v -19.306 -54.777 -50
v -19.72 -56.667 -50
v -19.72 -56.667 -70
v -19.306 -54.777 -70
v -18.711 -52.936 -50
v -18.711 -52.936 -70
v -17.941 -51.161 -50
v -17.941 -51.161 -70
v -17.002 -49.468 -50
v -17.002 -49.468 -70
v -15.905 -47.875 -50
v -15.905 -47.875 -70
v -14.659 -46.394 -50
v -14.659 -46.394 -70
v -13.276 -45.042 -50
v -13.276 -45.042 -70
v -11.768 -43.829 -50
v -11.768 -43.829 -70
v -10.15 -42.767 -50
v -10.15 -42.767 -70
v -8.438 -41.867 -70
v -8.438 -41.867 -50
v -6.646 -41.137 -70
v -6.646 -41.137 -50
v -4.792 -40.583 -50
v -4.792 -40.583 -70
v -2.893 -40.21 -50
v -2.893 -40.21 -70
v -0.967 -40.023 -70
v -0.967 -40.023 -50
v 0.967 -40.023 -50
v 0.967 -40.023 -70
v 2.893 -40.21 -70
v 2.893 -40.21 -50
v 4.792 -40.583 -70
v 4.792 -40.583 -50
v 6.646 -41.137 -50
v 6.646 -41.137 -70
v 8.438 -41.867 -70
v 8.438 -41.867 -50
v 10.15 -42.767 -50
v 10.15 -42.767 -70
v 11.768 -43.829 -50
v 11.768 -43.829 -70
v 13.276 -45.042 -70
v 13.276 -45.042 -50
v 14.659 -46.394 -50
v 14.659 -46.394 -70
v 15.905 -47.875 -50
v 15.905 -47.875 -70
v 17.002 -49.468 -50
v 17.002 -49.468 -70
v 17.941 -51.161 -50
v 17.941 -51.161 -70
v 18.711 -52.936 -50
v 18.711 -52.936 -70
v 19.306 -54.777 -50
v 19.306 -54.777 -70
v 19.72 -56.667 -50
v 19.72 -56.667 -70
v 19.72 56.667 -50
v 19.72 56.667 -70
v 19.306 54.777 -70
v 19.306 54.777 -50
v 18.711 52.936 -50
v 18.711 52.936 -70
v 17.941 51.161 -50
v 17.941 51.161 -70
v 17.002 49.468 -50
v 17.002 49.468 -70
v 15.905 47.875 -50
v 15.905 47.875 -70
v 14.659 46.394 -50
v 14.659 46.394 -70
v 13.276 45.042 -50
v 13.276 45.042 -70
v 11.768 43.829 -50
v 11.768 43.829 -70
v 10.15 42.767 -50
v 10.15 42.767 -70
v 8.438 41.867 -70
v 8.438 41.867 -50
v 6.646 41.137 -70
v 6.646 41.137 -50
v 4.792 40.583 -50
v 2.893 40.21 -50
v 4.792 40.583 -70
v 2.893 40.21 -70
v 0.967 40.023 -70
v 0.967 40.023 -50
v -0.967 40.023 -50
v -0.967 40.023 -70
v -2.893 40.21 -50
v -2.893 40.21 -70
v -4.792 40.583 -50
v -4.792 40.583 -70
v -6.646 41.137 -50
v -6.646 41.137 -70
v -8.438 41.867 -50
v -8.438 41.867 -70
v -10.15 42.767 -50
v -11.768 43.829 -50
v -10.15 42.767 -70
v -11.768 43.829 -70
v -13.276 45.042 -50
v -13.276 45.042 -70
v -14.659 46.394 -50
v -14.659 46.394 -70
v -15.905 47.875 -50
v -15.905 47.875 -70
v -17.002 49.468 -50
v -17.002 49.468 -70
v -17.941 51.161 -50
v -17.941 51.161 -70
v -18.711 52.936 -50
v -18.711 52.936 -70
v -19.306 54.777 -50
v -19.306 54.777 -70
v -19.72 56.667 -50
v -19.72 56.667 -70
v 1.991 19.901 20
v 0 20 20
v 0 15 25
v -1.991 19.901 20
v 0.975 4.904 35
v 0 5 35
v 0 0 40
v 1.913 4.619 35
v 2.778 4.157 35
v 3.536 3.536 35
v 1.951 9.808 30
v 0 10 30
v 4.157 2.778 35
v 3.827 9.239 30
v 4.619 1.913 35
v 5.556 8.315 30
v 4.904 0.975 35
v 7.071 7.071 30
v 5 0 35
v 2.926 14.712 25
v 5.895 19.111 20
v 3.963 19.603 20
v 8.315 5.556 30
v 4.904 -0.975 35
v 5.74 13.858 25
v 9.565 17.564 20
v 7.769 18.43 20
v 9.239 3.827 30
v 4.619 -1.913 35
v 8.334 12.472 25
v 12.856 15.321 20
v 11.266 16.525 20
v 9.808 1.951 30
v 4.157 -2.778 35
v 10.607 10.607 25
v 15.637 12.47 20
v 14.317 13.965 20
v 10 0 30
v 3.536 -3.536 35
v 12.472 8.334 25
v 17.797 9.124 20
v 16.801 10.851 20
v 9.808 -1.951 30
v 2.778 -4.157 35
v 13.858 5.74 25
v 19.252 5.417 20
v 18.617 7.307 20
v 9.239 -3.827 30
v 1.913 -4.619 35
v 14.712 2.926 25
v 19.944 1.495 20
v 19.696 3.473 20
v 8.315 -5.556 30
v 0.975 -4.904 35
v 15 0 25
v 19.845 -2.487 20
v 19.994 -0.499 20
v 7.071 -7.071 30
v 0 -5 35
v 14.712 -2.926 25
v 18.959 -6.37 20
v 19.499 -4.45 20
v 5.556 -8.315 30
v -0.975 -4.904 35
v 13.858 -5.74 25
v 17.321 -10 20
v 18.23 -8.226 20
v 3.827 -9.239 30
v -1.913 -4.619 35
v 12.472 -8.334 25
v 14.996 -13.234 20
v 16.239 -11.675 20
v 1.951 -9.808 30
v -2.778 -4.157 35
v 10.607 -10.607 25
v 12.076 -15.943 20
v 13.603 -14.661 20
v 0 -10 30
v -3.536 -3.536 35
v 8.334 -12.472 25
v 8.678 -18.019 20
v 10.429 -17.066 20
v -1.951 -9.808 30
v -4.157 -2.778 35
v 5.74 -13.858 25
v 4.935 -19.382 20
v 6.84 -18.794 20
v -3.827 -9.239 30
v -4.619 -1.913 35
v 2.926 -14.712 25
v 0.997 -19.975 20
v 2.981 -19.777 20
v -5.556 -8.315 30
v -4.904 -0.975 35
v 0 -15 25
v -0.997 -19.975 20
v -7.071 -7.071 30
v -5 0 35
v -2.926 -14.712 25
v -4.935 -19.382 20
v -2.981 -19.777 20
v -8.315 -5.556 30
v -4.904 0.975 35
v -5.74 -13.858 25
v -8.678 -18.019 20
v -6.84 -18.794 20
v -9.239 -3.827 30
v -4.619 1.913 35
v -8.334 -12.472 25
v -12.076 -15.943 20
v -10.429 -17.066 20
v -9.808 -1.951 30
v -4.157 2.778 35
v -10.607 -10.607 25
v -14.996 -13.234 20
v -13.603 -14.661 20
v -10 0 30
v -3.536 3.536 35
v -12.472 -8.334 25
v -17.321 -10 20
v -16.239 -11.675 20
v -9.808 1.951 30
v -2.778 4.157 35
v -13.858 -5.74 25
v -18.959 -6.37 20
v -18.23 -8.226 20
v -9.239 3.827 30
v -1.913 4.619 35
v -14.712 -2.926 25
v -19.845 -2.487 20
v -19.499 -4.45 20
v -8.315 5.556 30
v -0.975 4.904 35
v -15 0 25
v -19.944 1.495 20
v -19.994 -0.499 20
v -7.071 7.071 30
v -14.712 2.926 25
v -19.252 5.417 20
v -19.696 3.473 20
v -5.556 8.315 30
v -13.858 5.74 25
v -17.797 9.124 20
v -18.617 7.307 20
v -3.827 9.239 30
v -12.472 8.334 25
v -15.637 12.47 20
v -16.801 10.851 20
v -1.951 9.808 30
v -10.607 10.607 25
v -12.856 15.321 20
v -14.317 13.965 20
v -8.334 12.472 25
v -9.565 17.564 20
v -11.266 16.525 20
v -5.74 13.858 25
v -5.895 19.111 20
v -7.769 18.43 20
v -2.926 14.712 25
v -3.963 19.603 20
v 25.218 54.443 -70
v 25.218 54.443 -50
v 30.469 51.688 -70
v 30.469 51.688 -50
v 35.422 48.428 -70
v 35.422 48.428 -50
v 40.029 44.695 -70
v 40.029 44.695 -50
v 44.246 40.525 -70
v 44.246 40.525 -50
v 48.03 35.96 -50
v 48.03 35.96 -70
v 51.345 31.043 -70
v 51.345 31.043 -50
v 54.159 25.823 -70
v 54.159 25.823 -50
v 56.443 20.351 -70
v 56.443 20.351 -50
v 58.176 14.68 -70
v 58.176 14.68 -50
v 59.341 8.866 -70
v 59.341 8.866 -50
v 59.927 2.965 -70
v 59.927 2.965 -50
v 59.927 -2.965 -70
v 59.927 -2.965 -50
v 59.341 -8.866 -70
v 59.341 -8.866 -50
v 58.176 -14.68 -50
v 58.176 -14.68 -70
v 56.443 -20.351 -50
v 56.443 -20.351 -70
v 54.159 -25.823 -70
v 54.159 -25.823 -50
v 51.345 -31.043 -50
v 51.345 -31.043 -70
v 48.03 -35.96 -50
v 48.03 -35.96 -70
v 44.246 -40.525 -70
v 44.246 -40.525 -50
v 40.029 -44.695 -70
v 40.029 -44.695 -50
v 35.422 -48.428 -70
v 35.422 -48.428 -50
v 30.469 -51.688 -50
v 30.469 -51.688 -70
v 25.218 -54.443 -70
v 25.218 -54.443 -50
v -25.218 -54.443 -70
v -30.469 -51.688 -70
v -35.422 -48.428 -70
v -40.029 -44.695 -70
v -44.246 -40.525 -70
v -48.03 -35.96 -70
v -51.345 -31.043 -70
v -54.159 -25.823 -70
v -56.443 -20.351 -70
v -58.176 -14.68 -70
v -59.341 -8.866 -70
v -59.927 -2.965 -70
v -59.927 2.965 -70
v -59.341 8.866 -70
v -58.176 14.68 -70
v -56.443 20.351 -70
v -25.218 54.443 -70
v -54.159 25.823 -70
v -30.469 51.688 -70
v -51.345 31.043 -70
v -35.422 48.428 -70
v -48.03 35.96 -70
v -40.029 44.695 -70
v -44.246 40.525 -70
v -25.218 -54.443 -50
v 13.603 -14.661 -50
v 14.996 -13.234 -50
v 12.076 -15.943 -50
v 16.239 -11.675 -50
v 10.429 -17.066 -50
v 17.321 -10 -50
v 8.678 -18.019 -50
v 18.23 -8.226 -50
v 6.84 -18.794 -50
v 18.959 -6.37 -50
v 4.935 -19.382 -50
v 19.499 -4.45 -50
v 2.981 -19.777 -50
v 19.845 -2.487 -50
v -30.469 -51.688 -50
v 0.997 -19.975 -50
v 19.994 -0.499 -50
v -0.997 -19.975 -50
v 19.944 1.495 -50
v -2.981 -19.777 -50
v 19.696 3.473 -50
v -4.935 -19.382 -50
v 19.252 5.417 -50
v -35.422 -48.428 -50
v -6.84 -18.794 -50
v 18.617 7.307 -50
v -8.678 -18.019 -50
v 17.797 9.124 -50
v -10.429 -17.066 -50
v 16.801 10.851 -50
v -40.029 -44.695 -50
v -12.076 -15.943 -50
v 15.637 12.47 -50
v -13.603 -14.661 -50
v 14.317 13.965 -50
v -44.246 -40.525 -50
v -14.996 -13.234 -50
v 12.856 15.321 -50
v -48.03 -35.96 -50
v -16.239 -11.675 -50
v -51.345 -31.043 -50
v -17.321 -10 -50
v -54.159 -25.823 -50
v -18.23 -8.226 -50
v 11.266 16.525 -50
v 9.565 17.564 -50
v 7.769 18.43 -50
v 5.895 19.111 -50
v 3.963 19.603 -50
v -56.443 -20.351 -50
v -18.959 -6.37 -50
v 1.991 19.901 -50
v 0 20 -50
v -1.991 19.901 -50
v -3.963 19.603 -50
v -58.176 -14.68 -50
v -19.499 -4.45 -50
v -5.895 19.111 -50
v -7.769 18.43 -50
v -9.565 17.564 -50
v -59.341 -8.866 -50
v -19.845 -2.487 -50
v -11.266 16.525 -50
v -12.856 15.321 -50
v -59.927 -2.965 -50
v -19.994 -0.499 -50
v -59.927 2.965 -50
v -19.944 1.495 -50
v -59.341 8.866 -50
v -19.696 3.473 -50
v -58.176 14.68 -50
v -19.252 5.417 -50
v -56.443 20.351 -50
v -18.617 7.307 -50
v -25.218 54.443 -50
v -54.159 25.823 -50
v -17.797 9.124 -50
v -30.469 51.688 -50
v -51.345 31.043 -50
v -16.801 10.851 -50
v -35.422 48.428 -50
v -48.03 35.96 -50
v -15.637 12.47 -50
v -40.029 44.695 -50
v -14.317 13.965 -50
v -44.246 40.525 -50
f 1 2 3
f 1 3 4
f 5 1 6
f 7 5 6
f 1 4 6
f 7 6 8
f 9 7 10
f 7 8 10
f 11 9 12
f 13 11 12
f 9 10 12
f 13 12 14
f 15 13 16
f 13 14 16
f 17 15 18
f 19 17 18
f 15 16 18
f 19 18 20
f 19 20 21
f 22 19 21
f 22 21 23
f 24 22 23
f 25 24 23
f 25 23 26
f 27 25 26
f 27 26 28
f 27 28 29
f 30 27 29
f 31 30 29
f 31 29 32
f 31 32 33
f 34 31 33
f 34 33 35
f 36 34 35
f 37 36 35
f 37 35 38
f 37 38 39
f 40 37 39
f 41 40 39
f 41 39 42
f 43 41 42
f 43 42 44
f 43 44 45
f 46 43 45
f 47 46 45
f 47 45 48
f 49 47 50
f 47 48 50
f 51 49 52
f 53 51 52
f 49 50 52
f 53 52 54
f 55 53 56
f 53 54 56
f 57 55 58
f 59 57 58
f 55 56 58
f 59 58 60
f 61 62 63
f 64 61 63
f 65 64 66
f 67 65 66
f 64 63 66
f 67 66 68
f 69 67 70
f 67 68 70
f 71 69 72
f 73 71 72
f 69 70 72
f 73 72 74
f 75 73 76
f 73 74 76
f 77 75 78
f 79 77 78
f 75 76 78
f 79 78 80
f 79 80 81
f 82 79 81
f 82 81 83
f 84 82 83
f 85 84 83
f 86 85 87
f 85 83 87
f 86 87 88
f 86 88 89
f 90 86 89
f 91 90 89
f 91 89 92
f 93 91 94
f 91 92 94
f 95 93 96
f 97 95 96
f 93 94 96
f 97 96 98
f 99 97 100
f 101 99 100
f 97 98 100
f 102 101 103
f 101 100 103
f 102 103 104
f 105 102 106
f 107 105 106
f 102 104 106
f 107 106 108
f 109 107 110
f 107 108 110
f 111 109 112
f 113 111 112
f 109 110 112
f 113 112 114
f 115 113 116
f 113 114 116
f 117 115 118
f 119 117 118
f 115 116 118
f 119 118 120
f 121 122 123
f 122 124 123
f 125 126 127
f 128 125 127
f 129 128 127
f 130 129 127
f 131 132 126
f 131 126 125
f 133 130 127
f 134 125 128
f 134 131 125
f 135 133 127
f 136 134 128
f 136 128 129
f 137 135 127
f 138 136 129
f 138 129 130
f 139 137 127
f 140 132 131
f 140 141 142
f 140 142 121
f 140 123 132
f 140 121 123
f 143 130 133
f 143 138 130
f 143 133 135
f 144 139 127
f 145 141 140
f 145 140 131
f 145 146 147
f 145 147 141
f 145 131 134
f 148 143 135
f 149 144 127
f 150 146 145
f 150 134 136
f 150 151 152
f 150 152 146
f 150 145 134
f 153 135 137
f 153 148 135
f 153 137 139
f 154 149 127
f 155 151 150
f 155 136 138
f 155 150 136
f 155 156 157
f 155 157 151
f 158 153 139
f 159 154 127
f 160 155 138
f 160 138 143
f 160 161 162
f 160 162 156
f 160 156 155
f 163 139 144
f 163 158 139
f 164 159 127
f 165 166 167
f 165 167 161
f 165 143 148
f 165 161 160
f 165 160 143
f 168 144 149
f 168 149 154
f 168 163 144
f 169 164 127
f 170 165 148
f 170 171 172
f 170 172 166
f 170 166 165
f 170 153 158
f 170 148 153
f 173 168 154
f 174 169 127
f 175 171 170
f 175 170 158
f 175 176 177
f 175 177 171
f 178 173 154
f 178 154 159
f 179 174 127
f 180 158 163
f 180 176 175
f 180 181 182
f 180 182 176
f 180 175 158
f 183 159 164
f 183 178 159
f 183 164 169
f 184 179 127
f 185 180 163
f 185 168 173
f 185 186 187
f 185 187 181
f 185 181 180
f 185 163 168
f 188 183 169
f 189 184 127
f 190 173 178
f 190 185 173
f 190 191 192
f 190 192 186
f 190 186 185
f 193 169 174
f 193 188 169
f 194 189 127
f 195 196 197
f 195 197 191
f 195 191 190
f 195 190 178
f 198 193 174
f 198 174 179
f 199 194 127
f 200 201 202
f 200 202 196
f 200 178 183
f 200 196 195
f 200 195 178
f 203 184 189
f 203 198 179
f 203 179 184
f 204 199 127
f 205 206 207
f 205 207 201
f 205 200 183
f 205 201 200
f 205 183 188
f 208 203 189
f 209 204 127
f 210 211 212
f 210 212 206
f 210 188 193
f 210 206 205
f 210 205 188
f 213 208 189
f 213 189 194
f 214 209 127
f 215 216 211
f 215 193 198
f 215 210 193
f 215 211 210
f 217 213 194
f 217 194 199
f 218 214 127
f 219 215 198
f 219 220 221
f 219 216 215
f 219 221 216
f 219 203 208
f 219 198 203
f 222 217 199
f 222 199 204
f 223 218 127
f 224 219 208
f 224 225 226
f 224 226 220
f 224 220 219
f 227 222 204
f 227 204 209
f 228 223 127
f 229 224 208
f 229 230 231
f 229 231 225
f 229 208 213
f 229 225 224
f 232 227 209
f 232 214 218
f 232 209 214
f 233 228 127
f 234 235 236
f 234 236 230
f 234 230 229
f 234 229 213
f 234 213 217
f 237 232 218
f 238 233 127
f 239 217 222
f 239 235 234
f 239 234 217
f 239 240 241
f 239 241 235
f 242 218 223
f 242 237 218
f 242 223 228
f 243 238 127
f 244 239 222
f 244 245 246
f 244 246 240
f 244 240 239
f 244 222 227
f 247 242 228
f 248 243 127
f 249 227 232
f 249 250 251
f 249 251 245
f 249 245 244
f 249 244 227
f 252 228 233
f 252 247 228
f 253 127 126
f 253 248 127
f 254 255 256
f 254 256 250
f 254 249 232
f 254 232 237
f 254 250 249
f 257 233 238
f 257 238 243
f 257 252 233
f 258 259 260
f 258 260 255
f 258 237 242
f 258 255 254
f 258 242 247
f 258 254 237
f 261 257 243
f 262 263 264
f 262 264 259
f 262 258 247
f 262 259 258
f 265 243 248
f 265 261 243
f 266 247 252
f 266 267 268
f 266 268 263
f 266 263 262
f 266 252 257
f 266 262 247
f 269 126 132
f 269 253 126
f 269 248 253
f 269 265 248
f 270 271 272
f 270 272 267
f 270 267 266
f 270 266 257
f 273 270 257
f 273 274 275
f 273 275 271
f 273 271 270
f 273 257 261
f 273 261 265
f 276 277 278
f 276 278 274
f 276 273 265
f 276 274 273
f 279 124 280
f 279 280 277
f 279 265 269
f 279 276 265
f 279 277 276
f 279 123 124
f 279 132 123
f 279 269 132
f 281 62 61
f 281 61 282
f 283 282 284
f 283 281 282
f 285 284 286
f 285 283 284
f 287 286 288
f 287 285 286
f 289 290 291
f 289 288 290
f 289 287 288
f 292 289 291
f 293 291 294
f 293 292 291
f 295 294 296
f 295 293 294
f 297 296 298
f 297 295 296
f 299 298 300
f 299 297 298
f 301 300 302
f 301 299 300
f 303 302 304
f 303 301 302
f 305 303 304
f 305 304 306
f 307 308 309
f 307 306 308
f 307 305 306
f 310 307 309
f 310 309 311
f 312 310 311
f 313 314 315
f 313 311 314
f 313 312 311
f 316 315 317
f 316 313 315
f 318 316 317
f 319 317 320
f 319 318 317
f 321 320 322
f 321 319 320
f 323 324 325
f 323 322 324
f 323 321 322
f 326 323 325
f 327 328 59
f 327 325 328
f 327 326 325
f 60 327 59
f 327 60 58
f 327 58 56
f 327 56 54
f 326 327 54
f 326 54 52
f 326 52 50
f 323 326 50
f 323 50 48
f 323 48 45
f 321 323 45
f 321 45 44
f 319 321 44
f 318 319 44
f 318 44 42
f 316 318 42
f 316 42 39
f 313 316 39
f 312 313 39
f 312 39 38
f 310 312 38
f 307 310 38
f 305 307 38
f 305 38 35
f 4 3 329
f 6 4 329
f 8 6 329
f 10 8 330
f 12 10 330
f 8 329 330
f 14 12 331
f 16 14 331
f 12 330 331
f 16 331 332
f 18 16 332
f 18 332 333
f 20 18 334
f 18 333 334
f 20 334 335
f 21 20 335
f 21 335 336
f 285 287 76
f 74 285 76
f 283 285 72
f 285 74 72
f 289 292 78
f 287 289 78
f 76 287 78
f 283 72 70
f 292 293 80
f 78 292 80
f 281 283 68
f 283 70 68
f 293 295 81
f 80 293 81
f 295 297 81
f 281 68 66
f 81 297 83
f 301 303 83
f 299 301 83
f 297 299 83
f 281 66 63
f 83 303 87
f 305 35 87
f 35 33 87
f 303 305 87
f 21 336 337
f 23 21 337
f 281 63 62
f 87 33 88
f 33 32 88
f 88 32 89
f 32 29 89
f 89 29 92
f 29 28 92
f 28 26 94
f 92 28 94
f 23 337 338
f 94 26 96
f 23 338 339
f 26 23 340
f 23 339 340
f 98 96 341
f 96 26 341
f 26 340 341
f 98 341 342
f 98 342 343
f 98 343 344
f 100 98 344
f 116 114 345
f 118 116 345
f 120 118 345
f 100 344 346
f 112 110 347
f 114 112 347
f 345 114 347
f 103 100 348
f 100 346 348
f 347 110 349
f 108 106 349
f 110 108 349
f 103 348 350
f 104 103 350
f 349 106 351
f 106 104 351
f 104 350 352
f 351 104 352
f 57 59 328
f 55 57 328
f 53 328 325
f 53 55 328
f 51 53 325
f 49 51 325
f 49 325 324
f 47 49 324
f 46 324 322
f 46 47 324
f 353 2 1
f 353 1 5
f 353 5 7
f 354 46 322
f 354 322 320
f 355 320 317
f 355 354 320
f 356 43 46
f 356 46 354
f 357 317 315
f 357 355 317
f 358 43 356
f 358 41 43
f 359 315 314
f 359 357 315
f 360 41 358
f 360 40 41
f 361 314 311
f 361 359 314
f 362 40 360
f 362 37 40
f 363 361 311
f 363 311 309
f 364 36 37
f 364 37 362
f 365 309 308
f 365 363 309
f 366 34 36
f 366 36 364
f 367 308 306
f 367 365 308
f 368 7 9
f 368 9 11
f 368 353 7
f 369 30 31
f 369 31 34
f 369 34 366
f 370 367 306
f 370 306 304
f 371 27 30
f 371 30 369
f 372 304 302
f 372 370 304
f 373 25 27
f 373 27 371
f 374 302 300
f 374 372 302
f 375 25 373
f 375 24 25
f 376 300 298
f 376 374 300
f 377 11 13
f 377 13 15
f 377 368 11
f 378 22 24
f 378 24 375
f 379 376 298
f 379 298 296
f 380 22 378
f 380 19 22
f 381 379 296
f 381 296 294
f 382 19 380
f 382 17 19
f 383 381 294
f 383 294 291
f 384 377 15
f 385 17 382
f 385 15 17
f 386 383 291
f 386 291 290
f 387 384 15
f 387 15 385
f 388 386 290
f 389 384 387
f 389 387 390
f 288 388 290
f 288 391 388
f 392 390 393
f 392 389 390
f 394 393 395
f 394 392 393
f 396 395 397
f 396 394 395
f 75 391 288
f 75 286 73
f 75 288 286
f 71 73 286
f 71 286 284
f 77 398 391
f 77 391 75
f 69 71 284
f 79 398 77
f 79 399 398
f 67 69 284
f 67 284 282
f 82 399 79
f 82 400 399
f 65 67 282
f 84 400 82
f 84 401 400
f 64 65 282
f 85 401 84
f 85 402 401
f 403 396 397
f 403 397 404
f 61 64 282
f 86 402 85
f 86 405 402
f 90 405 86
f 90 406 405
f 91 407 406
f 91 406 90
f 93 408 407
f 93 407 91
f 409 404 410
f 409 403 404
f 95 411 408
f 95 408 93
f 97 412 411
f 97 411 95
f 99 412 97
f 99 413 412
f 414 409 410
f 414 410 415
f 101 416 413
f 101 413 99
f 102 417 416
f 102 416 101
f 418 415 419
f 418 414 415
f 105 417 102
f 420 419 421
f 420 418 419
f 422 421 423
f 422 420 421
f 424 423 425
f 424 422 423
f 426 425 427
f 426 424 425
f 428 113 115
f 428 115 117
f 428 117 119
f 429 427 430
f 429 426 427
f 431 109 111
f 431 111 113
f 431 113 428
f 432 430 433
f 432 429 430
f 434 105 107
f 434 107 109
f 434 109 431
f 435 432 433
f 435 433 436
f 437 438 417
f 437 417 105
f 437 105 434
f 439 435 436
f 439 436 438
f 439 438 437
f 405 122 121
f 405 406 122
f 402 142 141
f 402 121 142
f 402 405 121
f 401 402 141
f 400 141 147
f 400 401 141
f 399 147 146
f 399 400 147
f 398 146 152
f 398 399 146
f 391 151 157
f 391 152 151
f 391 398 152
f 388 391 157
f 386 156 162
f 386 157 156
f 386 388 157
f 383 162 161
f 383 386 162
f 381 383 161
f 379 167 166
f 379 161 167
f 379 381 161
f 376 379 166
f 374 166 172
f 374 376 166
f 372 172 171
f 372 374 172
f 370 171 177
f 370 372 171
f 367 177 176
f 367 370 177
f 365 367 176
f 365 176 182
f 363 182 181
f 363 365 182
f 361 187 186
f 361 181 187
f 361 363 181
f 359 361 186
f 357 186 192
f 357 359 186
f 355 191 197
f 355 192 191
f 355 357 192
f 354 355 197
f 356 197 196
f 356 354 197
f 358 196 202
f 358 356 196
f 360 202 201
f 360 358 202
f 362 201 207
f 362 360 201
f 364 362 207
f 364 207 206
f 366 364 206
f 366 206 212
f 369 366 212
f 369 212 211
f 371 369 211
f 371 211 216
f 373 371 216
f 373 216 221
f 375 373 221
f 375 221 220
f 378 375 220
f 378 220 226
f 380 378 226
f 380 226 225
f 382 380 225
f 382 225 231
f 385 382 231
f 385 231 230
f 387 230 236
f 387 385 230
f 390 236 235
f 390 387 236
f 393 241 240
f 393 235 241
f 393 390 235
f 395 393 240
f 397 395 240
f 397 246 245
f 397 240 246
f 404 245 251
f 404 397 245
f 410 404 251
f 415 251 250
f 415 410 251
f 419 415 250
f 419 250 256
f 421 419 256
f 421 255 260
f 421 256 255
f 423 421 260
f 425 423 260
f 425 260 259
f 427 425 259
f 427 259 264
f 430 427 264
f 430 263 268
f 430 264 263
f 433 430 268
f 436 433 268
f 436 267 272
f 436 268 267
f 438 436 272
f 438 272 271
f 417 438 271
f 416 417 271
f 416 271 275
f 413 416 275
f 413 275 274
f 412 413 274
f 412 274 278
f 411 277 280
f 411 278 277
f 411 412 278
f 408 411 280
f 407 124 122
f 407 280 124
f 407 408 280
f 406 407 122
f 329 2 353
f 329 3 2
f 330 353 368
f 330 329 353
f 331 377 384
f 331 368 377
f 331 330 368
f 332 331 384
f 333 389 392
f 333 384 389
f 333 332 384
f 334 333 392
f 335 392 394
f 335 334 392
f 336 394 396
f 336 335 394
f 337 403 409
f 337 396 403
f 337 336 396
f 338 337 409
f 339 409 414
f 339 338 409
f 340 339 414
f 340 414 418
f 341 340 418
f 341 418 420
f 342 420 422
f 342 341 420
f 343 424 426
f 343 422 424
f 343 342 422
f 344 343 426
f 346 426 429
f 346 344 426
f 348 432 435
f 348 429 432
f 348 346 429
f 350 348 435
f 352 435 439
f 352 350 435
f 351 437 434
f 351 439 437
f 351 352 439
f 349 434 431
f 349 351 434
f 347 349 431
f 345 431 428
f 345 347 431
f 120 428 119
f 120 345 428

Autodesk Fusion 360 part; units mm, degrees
sketch "Sketch1" plane through (0, 0, 0) normal (1, 0, 0) x (0, 1, 0)
  line L0 (0, 0) -> (0, 40)
  line L1 (0, 40) -> (20, 20)
  line L2 (38.614, 36.3802) -> (38.614, 30)
  line L3 (20, 20) -> (20, 0)
  line L4 (20, 0) -> (20, -50)
  line L5 (20, -50) -> (60, -50)
  line L6 (60, -50) -> (60, -70)
  line L7 (60, -70) -> (0, -70)
  line L8 (0, -70) -> (0, 40)
revolve "Revolve1" add sketch "Sketch1" angle 360 about axis through (0, 0, 1.75) along (0, 0, 1)
sketch "Sketch2" plane through (0, 0, 0) normal (1, 0, 0) x (0, 1, 0)
  line L0 (60, -50) -> (40, -50)
  line L1 (40, -50) -> (40, -70)
  line L2 (40, -70) -> (60, -70)
  line L3 (60, -70) -> (60, -50)
revolve "Revolve2" cut sketch "Sketch2" angle 360 about axis through (0, 60, -70) along (0, 0, 1)
mirror "Mirror1" about plane through (0, 0, 0) normal (0, 1, 0) of "Revolve2"
